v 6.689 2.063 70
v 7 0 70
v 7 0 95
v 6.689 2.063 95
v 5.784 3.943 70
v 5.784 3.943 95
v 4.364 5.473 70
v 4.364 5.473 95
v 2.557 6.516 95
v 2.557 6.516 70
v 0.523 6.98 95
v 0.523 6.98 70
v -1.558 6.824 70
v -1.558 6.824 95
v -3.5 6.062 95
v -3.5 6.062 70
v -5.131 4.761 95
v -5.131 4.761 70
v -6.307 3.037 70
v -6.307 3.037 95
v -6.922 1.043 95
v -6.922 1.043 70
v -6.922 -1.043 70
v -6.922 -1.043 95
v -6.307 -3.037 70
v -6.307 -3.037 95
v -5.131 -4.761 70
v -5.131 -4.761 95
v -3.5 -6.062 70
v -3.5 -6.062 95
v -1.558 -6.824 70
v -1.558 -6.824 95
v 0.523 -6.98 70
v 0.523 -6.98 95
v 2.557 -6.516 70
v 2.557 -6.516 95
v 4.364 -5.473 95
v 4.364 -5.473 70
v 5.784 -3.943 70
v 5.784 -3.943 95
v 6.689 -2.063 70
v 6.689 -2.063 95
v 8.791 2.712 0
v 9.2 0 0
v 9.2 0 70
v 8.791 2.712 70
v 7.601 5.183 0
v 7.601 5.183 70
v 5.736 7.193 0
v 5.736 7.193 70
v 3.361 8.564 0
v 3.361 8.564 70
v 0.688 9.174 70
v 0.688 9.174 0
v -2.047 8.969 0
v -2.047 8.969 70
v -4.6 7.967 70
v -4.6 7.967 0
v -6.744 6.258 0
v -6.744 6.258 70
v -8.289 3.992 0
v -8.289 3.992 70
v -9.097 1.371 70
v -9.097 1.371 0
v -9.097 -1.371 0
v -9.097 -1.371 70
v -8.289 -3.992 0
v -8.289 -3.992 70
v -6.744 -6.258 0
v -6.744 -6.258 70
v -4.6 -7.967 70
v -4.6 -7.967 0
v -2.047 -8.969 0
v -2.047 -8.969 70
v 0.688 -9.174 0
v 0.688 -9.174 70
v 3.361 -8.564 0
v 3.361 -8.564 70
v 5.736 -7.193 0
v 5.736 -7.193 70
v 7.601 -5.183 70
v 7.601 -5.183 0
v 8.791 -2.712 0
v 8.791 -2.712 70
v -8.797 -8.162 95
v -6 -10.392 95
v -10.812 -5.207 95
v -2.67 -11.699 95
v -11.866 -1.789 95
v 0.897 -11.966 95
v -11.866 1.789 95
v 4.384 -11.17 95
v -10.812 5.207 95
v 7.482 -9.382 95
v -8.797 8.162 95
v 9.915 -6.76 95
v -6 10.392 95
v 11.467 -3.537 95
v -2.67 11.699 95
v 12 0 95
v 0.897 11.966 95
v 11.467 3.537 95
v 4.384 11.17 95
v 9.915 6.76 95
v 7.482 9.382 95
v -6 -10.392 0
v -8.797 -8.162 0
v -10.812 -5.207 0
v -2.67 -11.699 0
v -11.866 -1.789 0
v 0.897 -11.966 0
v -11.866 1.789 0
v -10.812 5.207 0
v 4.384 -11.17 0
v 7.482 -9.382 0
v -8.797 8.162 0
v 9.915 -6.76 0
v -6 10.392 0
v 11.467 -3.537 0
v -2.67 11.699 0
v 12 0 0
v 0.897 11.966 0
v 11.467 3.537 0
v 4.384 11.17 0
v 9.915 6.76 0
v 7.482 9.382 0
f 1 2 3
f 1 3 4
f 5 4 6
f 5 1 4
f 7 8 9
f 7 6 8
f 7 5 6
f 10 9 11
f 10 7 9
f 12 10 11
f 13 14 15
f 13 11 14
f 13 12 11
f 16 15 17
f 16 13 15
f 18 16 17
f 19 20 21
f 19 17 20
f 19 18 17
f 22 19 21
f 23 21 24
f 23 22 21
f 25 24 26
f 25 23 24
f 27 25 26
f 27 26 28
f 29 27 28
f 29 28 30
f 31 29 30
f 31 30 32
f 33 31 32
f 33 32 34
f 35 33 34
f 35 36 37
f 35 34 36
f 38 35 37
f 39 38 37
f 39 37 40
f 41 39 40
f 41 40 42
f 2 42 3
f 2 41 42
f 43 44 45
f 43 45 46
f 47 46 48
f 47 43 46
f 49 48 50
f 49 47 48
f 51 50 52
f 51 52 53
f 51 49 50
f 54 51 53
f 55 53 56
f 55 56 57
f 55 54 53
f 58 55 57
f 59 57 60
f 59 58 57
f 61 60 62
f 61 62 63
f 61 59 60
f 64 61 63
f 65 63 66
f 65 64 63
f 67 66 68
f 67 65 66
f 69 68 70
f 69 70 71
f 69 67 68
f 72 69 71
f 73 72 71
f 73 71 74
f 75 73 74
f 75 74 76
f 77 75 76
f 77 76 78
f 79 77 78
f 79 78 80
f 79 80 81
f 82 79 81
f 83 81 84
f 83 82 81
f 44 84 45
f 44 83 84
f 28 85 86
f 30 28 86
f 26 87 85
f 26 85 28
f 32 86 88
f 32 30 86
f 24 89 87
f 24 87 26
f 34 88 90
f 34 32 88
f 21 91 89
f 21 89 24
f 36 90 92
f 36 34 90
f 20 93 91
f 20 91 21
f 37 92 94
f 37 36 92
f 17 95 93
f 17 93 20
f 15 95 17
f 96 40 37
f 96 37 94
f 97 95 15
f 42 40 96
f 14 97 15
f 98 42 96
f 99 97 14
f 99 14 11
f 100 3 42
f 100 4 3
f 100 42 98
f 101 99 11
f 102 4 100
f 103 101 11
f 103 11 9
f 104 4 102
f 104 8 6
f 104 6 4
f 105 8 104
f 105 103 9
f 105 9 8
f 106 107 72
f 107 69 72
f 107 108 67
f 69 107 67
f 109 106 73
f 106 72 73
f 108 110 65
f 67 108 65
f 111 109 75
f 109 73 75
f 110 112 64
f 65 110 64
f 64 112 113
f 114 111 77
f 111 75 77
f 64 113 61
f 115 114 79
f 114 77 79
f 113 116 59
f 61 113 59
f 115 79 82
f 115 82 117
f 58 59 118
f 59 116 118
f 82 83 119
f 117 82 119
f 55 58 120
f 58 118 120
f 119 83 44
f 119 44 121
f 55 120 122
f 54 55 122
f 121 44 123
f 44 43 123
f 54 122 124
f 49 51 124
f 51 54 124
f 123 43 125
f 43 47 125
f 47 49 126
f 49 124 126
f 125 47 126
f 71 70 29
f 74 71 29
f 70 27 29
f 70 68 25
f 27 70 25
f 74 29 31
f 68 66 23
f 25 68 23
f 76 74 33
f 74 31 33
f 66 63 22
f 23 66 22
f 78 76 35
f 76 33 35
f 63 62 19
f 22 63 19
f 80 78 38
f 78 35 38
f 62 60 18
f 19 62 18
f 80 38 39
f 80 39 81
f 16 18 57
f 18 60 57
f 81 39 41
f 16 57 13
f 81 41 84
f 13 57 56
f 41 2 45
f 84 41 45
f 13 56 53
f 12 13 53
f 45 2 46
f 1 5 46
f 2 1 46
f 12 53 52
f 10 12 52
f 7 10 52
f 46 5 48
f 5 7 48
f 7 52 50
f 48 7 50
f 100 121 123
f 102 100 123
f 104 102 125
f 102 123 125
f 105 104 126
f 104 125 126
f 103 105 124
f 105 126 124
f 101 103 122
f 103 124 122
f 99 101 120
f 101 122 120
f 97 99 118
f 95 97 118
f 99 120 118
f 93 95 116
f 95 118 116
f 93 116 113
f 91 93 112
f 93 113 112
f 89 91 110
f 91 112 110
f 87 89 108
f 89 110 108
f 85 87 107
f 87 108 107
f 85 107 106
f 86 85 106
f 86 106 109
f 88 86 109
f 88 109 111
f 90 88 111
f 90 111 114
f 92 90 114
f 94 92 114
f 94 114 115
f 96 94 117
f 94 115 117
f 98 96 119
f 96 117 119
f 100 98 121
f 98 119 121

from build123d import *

# Parameters (mm, degrees)
CYLINDER_R           = 12
CYLINDER_DEPTH       = 95
SKETCH_R             = 9.2
POCKET_DEPTH         = 70
SKETCH001_R          = 7
POCKET001_DEPTH      = 0.001
POCKET001_DEPTH_BACK = -95.001


with BuildPart() as part:
    # Cylinder → Cylinder (new body)
    with BuildSketch(Plane.XY):
        Circle(CYLINDER_R)
    extrude(amount=CYLINDER_DEPTH)

    # Sketch → Pocket (cut)
    with BuildSketch(Plane.XY):
        Circle(SKETCH_R)
    extrude(amount=POCKET_DEPTH, mode=Mode.SUBTRACT)

    # Sketch001 → Pocket001 (cut, two sides)
    with BuildSketch(Plane.XY) as pocket001_sk:
        Circle(SKETCH001_R)
    extrude(amount=-POCKET001_DEPTH, mode=Mode.SUBTRACT)
    extrude(pocket001_sk.sketch, amount=-POCKET001_DEPTH_BACK, mode=Mode.SUBTRACT)


solid = part.part
